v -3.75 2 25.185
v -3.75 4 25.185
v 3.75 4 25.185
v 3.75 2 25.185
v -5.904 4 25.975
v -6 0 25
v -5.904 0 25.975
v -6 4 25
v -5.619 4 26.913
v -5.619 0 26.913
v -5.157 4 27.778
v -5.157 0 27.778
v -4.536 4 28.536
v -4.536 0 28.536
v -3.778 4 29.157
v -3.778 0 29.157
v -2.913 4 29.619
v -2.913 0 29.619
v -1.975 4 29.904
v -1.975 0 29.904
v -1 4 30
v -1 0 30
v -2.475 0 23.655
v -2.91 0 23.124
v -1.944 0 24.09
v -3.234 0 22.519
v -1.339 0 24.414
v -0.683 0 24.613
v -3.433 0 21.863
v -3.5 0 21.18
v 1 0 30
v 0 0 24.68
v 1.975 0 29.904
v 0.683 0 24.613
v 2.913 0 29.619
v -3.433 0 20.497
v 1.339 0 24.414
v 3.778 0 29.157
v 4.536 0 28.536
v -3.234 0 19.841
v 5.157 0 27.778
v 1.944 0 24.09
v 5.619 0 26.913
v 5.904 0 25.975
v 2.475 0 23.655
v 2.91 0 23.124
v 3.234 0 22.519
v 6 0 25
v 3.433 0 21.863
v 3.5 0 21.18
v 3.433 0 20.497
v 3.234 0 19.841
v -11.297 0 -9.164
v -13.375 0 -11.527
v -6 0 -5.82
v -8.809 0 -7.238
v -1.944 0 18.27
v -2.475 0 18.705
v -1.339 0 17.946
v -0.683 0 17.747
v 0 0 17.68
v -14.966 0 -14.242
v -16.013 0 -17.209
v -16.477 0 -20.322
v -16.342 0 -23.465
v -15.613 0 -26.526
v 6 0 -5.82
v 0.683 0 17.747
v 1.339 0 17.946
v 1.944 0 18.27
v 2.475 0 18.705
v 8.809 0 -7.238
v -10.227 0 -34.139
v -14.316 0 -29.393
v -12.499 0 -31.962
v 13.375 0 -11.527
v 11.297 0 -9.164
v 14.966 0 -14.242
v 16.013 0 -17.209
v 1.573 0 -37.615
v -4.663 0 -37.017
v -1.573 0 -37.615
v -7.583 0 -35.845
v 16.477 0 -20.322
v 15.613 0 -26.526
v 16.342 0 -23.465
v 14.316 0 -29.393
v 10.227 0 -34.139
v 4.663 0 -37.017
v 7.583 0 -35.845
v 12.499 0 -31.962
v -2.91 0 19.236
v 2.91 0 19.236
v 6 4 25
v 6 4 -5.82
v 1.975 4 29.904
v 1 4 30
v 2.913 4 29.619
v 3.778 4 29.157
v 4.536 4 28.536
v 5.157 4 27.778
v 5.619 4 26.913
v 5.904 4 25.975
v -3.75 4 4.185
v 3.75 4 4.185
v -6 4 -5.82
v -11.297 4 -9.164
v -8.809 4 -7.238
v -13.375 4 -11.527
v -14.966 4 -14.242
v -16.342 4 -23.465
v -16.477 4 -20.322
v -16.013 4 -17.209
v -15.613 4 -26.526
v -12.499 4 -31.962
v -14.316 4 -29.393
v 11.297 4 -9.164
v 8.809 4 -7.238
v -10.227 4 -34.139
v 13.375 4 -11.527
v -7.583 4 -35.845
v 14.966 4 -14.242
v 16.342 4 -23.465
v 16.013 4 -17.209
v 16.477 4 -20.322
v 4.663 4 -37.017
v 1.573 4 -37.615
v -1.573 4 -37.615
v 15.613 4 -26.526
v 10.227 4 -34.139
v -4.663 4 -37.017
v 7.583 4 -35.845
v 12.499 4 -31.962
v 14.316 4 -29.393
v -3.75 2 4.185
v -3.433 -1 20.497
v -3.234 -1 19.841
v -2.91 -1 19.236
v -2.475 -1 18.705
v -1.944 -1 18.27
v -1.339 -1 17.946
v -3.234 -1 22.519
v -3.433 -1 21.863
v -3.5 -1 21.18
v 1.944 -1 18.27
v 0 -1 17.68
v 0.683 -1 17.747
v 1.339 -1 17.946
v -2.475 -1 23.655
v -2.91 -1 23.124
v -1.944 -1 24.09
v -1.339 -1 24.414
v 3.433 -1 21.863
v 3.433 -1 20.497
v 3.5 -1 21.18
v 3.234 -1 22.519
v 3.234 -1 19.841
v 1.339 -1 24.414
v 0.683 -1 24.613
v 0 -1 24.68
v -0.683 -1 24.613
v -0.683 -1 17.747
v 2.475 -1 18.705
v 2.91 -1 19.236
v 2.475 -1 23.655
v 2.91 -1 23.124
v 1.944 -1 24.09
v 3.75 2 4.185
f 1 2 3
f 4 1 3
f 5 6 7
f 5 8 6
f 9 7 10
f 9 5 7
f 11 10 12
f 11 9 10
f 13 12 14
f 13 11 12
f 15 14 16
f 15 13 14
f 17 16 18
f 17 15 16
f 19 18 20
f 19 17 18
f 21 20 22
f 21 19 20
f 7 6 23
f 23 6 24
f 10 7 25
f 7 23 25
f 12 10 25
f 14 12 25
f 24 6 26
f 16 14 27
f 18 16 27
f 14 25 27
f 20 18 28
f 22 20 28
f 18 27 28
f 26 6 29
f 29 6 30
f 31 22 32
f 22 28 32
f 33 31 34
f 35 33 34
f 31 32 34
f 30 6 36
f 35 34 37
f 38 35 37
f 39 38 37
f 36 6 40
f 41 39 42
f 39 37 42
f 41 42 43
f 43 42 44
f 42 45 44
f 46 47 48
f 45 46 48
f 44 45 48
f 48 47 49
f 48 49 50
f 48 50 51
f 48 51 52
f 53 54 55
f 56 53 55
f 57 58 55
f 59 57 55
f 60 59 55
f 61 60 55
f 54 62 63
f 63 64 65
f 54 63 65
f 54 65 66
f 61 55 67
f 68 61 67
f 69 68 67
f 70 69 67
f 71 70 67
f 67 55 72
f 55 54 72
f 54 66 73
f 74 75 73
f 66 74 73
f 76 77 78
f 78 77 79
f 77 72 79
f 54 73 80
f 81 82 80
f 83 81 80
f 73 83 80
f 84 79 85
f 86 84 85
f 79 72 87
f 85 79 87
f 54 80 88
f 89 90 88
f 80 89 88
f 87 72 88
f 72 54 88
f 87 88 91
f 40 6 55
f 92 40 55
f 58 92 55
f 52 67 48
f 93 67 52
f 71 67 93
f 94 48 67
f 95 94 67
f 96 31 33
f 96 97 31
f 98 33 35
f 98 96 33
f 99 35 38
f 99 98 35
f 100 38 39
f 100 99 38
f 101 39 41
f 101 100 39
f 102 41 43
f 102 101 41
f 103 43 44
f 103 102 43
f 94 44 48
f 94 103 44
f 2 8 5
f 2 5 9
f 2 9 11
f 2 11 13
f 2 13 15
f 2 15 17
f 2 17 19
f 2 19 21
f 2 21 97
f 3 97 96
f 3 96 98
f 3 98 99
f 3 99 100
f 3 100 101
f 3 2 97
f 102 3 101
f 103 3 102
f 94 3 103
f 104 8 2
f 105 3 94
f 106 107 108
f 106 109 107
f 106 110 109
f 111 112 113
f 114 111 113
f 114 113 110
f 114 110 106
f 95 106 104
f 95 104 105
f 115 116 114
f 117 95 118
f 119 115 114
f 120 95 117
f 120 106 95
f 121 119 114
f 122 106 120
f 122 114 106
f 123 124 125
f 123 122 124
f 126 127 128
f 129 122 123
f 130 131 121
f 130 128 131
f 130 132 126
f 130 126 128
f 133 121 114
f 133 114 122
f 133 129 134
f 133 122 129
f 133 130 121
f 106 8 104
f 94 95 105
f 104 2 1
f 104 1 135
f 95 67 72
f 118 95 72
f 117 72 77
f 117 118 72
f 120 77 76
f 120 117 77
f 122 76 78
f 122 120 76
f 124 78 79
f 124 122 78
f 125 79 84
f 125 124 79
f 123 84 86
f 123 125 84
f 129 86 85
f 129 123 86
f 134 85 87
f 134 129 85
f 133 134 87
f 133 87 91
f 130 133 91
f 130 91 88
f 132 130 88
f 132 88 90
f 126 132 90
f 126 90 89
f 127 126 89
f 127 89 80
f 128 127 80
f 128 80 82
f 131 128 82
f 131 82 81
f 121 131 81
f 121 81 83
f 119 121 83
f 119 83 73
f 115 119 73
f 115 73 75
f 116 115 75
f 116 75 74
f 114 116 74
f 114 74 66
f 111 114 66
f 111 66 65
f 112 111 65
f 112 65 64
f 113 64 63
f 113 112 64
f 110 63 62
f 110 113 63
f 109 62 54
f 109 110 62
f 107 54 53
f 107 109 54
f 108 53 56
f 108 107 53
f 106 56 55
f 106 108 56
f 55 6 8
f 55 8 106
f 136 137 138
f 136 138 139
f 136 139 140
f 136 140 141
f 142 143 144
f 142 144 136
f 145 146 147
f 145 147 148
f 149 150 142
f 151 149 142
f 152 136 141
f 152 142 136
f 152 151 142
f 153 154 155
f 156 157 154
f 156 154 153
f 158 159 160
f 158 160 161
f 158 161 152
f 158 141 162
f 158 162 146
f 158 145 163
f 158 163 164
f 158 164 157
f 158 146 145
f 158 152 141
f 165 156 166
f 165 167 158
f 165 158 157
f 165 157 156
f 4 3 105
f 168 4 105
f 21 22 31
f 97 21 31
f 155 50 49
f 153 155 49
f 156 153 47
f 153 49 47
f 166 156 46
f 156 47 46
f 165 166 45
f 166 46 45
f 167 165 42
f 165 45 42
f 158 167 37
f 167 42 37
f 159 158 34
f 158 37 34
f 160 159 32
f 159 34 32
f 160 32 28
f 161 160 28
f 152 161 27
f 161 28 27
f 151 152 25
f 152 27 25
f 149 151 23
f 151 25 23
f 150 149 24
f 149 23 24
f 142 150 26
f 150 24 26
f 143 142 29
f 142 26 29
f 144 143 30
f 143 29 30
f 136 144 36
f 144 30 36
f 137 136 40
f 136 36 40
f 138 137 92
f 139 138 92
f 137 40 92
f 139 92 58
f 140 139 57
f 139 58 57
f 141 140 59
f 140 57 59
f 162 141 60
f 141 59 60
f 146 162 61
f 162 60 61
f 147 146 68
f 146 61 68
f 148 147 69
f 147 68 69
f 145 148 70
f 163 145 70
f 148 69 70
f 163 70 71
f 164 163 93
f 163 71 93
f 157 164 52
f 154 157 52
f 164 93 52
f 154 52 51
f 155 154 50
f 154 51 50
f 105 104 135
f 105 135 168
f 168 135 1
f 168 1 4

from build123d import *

# Parameters (mm, degrees)
SKETCH1_W           = 12
SKETCH1_H           = 60
BOSS_EXTRUDE1_DEPTH = 4
SKETCH2_W           = 7.5
SKETCH2_H           = 21
CUT_EXTRUDE1_DEPTH  = 2
SKETCH4_R           = 3.5
BOSS_EXTRUDE2_DEPTH = 1
SKETCH5_R           = 16.5
BOSS_EXTRUDE3_DEPTH = 4
FILLET2_R           = 5


with BuildPart() as part:
    # Sketch1 → Boss-Extrude1 (new body)
    with BuildSketch(Plane(origin=(0, 0, 0), x_dir=(1, 0, 0), z_dir=(0, 1, 0))):
        Rectangle(SKETCH1_W, SKETCH1_H)
    extrude(amount=BOSS_EXTRUDE1_DEPTH)

    # Sketch2 → Cut-Extrude1 (cut)
    with BuildSketch(Plane(origin=(0, 4, 0), x_dir=(1, 0, 0), z_dir=(0, 1, 0))):
        with Locations((0, -14.685)):
            Rectangle(SKETCH2_W, SKETCH2_H)
    extrude(amount=-CUT_EXTRUDE1_DEPTH, mode=Mode.SUBTRACT)

    # Sketch4 → Boss-Extrude2 (add)
    with BuildSketch(Plane.XZ):
        with Locations((0, 21.18)):
            Circle(SKETCH4_R)
    extrude(amount=BOSS_EXTRUDE2_DEPTH)

    # Sketch5 → Boss-Extrude3 (add)
    with BuildSketch(Plane(origin=(0, 4, 0), x_dir=(1, 0, 0), z_dir=(0, 1, 0))):
        with Locations((0, 21.19)):
            Circle(SKETCH5_R)
    extrude(amount=-BOSS_EXTRUDE3_DEPTH)

    # Fillet2
    fillet2_edges = [part.edges().sort_by_distance(p)[0] for p in [
        (6, 2, 30),
        (-6, 2, 30),
    ]]
    fillet(fillet2_edges, radius=FILLET2_R)


solid = part.part
